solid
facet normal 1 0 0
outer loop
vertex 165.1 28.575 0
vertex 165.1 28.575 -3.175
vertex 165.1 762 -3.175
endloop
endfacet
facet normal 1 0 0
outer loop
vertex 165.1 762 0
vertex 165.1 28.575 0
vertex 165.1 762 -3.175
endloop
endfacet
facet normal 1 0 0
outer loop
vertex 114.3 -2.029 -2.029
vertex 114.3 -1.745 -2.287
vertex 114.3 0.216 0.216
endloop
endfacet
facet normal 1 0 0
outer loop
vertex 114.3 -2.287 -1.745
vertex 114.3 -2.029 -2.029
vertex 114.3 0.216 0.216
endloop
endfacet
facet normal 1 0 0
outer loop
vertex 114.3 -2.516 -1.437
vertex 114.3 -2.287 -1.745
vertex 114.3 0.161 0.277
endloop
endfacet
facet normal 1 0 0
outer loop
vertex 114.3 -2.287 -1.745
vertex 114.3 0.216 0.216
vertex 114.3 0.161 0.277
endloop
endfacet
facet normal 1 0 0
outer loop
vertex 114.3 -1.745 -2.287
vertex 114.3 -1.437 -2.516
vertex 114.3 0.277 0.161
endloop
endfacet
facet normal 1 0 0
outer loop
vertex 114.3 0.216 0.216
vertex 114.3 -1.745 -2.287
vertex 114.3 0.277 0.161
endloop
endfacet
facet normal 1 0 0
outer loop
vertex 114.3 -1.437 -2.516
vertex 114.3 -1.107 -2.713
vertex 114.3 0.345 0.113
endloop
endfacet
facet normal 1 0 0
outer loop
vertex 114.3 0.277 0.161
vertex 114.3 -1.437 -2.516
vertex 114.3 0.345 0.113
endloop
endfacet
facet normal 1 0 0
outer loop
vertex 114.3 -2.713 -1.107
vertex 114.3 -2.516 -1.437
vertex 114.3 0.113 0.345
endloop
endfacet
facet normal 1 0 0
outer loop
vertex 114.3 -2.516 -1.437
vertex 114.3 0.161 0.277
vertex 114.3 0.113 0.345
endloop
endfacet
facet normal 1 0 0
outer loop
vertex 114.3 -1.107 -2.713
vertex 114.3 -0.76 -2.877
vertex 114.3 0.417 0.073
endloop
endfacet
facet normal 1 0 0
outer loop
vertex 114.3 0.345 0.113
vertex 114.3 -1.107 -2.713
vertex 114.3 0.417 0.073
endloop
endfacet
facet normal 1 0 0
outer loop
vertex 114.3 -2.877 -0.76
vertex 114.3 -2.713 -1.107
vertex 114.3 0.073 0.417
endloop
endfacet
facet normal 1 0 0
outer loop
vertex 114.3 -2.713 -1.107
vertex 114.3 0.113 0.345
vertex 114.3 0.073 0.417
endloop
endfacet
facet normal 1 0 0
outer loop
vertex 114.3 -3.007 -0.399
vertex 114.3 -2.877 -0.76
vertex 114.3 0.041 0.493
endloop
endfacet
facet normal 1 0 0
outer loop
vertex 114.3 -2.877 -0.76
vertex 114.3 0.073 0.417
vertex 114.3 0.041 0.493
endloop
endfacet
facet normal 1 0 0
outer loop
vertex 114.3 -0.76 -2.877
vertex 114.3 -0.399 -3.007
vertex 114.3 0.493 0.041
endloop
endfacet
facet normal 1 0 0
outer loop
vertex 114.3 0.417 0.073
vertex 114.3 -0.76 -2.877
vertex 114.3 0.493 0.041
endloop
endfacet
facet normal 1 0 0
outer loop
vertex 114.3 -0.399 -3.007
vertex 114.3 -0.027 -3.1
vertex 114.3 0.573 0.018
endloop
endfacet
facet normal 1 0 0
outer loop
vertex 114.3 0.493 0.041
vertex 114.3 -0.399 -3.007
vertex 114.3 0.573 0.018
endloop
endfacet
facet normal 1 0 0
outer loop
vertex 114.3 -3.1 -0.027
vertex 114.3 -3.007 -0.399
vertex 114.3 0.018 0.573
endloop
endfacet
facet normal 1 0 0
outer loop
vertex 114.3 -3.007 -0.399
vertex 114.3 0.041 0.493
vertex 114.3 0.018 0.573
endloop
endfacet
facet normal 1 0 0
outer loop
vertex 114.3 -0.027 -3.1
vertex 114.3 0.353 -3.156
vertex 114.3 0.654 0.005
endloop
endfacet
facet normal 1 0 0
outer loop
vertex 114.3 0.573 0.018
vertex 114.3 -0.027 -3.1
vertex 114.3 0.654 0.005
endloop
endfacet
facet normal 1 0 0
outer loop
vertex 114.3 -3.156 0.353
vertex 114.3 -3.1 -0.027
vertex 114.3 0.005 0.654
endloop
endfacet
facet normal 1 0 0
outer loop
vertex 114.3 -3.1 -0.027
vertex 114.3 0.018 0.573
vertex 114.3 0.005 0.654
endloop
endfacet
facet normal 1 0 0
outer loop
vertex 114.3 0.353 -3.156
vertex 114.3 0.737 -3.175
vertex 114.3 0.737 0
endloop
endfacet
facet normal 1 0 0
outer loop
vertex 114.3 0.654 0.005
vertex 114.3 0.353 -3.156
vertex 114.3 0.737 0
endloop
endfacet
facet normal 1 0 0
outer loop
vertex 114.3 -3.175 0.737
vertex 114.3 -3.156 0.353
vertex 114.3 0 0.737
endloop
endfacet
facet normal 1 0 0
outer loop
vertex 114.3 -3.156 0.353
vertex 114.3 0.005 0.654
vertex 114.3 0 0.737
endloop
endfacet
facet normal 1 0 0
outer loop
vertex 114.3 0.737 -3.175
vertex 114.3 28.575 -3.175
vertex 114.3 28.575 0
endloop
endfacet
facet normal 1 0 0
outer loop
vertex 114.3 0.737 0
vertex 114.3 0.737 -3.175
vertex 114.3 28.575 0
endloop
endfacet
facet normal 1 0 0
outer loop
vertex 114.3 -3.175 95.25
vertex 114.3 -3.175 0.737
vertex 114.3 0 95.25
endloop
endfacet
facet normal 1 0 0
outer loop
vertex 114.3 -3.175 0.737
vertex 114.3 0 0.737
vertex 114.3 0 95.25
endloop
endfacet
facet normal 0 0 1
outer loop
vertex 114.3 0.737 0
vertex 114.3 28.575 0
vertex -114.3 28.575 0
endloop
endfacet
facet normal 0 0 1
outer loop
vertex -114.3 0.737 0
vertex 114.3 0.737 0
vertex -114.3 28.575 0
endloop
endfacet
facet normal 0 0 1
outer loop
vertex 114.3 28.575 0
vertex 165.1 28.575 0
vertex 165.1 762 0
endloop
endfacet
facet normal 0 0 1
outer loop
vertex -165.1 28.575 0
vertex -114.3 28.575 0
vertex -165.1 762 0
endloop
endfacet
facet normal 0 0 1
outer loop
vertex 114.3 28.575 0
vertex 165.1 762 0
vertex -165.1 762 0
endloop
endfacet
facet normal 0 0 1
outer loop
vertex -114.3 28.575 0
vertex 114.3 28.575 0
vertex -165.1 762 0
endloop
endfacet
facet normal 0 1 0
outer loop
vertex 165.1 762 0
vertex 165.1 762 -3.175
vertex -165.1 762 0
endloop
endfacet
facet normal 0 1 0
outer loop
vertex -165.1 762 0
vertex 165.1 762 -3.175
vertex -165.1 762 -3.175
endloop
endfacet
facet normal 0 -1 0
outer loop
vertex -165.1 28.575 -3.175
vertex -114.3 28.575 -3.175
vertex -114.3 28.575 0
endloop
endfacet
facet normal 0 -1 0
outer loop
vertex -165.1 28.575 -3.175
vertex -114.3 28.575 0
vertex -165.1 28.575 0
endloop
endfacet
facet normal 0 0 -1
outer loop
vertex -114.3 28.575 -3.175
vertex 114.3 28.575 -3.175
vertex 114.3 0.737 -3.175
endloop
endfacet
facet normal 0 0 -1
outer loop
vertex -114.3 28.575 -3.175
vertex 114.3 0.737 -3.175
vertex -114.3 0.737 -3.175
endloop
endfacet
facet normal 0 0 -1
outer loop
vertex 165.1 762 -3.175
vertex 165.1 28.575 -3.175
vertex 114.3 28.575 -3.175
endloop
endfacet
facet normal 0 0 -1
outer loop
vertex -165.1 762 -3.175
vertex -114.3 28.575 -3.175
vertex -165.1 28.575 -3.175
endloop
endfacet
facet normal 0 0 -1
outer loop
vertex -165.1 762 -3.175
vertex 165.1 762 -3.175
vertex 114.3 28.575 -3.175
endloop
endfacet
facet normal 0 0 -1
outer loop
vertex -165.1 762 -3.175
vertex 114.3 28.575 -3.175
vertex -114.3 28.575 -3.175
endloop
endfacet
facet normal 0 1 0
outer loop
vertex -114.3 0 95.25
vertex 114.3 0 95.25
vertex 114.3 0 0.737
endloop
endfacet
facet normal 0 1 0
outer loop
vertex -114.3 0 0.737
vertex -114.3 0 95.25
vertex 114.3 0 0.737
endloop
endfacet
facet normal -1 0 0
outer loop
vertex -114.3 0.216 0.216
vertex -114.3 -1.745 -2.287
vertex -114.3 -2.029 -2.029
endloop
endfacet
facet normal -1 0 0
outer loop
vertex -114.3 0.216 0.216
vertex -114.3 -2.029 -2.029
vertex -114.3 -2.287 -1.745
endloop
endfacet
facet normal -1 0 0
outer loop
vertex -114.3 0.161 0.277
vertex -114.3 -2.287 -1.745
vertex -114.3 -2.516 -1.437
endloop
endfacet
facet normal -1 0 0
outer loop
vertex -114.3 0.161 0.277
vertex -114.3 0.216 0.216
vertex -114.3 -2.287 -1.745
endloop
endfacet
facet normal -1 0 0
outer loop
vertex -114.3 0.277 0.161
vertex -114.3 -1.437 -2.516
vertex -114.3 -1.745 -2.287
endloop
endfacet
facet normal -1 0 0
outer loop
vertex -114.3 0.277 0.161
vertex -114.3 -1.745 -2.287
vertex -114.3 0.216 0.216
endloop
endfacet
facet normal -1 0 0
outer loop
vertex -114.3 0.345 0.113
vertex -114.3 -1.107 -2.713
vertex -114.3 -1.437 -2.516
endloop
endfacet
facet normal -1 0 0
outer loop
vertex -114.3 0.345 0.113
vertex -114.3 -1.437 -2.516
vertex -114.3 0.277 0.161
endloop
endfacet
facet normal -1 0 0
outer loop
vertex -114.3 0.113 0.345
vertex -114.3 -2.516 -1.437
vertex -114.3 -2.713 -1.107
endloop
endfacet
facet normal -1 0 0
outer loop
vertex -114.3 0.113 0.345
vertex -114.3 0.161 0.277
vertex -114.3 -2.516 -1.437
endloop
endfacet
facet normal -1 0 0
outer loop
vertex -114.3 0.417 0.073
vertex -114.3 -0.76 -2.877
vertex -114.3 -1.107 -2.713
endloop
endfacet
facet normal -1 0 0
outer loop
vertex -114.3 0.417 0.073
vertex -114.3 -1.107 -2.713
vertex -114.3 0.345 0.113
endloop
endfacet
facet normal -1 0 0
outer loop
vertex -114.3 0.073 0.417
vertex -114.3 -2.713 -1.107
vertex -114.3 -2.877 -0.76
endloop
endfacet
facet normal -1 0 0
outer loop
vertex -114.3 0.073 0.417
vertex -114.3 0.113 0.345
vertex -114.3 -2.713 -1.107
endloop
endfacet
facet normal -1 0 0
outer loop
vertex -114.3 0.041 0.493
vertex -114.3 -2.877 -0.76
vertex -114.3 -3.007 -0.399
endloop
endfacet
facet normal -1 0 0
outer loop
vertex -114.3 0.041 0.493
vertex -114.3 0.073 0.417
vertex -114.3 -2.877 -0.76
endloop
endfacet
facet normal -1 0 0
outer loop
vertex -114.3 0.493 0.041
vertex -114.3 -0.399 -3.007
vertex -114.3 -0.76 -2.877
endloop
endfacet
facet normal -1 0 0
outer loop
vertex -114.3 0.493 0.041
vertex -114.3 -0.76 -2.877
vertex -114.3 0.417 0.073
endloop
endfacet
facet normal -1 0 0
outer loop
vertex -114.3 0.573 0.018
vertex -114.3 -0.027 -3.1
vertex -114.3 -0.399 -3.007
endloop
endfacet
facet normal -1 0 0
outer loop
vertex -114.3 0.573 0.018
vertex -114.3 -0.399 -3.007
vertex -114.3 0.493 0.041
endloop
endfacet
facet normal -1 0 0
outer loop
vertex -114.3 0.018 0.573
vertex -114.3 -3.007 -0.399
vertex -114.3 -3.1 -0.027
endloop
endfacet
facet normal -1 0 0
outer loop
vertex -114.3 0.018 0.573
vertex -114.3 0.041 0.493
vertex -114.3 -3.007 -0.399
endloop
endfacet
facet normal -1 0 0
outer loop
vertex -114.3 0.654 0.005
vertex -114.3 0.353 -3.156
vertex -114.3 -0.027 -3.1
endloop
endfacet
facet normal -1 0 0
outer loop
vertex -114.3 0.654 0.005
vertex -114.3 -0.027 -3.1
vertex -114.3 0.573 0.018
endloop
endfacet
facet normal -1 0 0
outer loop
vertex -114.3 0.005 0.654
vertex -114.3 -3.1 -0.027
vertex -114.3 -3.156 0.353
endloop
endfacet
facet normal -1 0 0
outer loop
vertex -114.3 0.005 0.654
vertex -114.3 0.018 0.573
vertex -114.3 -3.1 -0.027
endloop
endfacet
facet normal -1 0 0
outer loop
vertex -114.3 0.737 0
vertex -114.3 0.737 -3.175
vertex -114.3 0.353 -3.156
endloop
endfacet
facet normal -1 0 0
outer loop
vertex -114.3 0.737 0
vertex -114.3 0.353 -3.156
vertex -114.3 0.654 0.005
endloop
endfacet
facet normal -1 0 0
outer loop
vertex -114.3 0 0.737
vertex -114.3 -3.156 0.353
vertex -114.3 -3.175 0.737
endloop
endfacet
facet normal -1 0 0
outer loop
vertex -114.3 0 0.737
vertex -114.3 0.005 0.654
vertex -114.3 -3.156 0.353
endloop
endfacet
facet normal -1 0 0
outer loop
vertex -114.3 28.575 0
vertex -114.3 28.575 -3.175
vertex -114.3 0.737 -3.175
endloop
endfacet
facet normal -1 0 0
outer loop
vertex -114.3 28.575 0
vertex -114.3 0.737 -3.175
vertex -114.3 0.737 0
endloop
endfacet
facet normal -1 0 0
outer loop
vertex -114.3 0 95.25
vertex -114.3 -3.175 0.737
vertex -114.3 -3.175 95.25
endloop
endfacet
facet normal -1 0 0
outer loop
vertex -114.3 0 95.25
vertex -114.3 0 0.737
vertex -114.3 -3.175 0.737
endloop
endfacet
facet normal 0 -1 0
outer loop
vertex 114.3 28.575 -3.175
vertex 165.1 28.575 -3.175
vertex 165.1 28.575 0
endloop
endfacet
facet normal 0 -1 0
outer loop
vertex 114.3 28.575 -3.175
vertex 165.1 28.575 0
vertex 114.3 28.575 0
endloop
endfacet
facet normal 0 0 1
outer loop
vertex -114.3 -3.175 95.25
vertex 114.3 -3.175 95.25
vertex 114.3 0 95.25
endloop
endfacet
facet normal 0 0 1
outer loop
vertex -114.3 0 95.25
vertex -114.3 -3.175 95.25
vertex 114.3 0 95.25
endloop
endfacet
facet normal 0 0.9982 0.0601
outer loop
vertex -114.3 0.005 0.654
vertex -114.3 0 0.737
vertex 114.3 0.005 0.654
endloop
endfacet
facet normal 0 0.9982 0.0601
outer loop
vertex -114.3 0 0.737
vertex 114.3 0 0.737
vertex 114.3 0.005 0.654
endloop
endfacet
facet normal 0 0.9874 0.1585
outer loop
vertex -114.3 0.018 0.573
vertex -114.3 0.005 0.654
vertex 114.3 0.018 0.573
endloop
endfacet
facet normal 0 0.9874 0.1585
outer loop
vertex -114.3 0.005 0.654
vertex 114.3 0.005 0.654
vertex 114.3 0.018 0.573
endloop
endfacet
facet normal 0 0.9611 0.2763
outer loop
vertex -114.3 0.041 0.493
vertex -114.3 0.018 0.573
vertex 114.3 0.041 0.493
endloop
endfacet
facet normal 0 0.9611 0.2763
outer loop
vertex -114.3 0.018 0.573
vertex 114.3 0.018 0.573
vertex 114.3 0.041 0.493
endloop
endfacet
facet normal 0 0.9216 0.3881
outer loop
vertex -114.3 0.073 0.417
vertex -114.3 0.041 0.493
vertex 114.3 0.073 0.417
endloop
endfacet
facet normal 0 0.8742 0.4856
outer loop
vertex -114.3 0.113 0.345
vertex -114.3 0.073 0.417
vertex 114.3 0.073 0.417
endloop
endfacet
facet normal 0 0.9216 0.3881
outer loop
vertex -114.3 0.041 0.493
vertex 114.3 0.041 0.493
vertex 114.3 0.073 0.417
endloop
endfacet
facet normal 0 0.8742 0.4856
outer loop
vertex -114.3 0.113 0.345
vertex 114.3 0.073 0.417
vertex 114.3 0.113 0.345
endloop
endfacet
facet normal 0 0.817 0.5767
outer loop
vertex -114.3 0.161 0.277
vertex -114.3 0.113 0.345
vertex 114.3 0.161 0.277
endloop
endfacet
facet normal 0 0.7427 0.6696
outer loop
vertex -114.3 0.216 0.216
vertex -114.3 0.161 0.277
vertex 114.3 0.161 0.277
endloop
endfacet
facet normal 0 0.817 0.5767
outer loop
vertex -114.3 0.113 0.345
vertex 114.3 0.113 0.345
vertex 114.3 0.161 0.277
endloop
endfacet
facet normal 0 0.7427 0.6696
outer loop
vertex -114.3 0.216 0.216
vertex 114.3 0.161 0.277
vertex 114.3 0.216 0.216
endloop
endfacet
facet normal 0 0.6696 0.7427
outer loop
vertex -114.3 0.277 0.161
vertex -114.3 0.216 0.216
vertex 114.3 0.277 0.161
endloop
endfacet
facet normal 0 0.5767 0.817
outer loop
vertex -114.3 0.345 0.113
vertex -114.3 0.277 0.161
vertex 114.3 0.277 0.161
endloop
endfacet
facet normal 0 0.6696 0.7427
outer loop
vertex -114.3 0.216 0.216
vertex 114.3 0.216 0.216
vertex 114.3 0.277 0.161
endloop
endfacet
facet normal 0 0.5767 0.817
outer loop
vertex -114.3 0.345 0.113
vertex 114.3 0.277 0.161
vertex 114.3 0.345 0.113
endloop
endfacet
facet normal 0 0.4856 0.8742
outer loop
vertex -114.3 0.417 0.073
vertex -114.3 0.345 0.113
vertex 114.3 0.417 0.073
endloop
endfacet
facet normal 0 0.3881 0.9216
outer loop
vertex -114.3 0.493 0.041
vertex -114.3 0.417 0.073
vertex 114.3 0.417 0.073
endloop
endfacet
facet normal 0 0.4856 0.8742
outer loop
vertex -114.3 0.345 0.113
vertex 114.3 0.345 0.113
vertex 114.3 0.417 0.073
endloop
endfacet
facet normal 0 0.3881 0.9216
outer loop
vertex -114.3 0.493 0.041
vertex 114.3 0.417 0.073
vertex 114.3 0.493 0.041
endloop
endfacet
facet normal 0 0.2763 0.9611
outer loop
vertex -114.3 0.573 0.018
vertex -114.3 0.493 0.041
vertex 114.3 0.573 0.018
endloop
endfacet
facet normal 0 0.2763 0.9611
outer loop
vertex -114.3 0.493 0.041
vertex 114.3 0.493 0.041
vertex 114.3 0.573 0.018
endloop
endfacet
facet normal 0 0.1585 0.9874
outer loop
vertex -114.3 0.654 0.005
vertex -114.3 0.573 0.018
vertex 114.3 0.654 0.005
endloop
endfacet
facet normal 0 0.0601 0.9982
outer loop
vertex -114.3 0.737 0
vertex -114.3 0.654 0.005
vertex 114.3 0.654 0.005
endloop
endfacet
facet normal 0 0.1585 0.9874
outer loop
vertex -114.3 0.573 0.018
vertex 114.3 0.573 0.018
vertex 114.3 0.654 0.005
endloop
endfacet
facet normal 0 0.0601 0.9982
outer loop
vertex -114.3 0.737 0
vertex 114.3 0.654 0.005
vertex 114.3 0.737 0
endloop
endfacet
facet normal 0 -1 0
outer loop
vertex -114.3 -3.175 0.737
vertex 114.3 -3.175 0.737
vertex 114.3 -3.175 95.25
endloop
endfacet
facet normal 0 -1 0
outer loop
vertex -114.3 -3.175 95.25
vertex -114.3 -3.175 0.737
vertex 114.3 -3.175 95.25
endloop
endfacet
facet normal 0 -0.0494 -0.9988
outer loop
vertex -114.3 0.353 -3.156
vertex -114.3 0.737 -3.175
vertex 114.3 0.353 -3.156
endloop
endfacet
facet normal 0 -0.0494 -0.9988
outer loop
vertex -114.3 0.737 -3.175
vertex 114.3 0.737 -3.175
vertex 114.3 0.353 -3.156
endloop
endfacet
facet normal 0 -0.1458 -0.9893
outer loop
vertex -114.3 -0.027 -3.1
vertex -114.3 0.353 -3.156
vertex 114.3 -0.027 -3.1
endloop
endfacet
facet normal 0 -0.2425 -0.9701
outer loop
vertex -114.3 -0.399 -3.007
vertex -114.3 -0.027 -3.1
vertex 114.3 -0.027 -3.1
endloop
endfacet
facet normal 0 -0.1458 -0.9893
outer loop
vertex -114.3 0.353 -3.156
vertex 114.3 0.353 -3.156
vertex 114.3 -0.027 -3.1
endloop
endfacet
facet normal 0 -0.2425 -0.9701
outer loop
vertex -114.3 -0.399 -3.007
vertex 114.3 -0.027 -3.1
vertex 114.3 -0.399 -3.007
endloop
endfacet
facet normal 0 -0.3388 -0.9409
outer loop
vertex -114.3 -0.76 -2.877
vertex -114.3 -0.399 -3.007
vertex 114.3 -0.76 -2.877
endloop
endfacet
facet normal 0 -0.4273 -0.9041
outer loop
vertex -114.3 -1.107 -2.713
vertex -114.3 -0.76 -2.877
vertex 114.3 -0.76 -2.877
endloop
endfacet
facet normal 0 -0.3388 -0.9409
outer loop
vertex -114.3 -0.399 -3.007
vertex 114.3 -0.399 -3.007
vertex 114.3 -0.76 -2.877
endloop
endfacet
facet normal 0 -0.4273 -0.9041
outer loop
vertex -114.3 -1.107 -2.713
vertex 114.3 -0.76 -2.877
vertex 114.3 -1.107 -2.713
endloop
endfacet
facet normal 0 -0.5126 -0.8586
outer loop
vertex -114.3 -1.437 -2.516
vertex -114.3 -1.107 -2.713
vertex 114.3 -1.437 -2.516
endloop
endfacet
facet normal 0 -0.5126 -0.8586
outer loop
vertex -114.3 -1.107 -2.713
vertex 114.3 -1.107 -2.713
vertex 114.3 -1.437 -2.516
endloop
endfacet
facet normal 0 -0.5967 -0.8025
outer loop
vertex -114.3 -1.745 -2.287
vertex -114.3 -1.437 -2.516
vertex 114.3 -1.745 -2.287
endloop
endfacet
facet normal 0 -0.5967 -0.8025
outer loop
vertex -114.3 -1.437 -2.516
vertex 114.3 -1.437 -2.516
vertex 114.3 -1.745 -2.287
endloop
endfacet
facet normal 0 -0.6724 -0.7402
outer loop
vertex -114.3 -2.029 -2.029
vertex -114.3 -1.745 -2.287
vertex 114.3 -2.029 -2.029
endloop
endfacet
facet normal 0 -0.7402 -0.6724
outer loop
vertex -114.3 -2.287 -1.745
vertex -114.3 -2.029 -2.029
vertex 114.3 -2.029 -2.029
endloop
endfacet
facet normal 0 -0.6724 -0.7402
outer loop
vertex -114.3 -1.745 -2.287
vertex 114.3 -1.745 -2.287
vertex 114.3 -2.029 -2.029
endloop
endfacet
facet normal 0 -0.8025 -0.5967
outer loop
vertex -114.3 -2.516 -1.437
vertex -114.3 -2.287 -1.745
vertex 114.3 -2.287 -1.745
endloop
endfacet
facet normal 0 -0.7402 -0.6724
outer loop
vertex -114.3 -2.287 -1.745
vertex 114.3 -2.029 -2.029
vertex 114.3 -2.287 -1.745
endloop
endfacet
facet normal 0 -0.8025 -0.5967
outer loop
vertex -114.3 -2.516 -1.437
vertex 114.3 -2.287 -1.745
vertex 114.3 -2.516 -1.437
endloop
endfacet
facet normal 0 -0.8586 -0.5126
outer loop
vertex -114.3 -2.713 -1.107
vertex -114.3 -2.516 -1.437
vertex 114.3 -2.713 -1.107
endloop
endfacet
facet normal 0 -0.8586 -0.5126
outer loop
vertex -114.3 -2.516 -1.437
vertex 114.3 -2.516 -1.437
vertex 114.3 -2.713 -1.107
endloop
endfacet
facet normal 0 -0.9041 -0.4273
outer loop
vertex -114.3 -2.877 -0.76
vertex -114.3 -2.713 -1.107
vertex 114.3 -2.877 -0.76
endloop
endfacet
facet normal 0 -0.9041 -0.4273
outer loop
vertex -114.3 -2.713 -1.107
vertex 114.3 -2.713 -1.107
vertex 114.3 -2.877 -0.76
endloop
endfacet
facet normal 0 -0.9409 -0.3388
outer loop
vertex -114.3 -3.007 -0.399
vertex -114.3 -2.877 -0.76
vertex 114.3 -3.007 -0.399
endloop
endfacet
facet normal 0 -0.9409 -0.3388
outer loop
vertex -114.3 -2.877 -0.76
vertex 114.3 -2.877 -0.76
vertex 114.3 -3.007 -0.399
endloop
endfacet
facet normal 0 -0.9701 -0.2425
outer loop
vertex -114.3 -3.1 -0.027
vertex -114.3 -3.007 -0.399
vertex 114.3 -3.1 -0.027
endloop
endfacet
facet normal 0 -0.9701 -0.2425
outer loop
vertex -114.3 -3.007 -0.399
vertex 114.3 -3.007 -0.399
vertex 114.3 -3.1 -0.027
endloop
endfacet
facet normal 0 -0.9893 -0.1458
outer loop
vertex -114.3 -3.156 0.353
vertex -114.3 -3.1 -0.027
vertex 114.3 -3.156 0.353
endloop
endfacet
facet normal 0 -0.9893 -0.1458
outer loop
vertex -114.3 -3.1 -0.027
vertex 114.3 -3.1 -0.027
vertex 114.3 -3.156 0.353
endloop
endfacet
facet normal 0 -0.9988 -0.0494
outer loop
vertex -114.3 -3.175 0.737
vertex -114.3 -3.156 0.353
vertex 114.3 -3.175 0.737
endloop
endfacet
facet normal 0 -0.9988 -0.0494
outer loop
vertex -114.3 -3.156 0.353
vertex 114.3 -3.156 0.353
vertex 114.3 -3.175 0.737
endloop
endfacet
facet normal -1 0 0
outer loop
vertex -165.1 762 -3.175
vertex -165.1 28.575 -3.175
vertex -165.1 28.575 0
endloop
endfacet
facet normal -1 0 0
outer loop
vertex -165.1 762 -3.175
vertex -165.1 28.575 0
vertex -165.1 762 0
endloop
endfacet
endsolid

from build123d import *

# Parameters (mm, degrees)
BASE_FLANGE1_DEPTH = 114.3
SKETCH6_W          = 50.8
SKETCH6_H          = 733.425
TAB1_DEPTH         = 3.175


# Sheet-metal steps are written as plain solids
with BuildPart() as part:
    # Sketch1 → Base-Flange1 (new, symmetric)
    with BuildSketch(Plane(origin=(0, 0, 0), x_dir=(0, 0, -1), z_dir=(1, 0, 0))):
        with BuildLine():
            Line((-95.25, 0), (-0.7366, 0))
            ThreePointArc((-0.7366, 0), (-0.215745145, 0.215745145), (0, 0.7366))
            Line((0, 0.7366), (0, 762))
            Line((0, 762), (3.175, 762))
            Line((3.175, 762), (3.175, 0.7366))
            ThreePointArc((3.175, 0.7366), (2.029318885, -2.029318885), (-0.7366, -3.175))
            Line((-0.7366, -3.175), (-95.25, -3.175))
            Line((-95.25, -3.175), (-95.25, 0))
        make_face()
    extrude(amount=BASE_FLANGE1_DEPTH, both=True)

    # Sketch6 → Tab1 (add)
    with BuildSketch(Plane(origin=(0, 0, -3.175), x_dir=(-1, 0, 0), z_dir=(0, 0, -1))):
        with Locations((-139.7, 395.2875)):
            Rectangle(SKETCH6_W, SKETCH6_H)
        with Locations((139.7, 395.2875)):
            Rectangle(SKETCH6_W, SKETCH6_H)
    extrude(amount=-TAB1_DEPTH)


solid = part.part
